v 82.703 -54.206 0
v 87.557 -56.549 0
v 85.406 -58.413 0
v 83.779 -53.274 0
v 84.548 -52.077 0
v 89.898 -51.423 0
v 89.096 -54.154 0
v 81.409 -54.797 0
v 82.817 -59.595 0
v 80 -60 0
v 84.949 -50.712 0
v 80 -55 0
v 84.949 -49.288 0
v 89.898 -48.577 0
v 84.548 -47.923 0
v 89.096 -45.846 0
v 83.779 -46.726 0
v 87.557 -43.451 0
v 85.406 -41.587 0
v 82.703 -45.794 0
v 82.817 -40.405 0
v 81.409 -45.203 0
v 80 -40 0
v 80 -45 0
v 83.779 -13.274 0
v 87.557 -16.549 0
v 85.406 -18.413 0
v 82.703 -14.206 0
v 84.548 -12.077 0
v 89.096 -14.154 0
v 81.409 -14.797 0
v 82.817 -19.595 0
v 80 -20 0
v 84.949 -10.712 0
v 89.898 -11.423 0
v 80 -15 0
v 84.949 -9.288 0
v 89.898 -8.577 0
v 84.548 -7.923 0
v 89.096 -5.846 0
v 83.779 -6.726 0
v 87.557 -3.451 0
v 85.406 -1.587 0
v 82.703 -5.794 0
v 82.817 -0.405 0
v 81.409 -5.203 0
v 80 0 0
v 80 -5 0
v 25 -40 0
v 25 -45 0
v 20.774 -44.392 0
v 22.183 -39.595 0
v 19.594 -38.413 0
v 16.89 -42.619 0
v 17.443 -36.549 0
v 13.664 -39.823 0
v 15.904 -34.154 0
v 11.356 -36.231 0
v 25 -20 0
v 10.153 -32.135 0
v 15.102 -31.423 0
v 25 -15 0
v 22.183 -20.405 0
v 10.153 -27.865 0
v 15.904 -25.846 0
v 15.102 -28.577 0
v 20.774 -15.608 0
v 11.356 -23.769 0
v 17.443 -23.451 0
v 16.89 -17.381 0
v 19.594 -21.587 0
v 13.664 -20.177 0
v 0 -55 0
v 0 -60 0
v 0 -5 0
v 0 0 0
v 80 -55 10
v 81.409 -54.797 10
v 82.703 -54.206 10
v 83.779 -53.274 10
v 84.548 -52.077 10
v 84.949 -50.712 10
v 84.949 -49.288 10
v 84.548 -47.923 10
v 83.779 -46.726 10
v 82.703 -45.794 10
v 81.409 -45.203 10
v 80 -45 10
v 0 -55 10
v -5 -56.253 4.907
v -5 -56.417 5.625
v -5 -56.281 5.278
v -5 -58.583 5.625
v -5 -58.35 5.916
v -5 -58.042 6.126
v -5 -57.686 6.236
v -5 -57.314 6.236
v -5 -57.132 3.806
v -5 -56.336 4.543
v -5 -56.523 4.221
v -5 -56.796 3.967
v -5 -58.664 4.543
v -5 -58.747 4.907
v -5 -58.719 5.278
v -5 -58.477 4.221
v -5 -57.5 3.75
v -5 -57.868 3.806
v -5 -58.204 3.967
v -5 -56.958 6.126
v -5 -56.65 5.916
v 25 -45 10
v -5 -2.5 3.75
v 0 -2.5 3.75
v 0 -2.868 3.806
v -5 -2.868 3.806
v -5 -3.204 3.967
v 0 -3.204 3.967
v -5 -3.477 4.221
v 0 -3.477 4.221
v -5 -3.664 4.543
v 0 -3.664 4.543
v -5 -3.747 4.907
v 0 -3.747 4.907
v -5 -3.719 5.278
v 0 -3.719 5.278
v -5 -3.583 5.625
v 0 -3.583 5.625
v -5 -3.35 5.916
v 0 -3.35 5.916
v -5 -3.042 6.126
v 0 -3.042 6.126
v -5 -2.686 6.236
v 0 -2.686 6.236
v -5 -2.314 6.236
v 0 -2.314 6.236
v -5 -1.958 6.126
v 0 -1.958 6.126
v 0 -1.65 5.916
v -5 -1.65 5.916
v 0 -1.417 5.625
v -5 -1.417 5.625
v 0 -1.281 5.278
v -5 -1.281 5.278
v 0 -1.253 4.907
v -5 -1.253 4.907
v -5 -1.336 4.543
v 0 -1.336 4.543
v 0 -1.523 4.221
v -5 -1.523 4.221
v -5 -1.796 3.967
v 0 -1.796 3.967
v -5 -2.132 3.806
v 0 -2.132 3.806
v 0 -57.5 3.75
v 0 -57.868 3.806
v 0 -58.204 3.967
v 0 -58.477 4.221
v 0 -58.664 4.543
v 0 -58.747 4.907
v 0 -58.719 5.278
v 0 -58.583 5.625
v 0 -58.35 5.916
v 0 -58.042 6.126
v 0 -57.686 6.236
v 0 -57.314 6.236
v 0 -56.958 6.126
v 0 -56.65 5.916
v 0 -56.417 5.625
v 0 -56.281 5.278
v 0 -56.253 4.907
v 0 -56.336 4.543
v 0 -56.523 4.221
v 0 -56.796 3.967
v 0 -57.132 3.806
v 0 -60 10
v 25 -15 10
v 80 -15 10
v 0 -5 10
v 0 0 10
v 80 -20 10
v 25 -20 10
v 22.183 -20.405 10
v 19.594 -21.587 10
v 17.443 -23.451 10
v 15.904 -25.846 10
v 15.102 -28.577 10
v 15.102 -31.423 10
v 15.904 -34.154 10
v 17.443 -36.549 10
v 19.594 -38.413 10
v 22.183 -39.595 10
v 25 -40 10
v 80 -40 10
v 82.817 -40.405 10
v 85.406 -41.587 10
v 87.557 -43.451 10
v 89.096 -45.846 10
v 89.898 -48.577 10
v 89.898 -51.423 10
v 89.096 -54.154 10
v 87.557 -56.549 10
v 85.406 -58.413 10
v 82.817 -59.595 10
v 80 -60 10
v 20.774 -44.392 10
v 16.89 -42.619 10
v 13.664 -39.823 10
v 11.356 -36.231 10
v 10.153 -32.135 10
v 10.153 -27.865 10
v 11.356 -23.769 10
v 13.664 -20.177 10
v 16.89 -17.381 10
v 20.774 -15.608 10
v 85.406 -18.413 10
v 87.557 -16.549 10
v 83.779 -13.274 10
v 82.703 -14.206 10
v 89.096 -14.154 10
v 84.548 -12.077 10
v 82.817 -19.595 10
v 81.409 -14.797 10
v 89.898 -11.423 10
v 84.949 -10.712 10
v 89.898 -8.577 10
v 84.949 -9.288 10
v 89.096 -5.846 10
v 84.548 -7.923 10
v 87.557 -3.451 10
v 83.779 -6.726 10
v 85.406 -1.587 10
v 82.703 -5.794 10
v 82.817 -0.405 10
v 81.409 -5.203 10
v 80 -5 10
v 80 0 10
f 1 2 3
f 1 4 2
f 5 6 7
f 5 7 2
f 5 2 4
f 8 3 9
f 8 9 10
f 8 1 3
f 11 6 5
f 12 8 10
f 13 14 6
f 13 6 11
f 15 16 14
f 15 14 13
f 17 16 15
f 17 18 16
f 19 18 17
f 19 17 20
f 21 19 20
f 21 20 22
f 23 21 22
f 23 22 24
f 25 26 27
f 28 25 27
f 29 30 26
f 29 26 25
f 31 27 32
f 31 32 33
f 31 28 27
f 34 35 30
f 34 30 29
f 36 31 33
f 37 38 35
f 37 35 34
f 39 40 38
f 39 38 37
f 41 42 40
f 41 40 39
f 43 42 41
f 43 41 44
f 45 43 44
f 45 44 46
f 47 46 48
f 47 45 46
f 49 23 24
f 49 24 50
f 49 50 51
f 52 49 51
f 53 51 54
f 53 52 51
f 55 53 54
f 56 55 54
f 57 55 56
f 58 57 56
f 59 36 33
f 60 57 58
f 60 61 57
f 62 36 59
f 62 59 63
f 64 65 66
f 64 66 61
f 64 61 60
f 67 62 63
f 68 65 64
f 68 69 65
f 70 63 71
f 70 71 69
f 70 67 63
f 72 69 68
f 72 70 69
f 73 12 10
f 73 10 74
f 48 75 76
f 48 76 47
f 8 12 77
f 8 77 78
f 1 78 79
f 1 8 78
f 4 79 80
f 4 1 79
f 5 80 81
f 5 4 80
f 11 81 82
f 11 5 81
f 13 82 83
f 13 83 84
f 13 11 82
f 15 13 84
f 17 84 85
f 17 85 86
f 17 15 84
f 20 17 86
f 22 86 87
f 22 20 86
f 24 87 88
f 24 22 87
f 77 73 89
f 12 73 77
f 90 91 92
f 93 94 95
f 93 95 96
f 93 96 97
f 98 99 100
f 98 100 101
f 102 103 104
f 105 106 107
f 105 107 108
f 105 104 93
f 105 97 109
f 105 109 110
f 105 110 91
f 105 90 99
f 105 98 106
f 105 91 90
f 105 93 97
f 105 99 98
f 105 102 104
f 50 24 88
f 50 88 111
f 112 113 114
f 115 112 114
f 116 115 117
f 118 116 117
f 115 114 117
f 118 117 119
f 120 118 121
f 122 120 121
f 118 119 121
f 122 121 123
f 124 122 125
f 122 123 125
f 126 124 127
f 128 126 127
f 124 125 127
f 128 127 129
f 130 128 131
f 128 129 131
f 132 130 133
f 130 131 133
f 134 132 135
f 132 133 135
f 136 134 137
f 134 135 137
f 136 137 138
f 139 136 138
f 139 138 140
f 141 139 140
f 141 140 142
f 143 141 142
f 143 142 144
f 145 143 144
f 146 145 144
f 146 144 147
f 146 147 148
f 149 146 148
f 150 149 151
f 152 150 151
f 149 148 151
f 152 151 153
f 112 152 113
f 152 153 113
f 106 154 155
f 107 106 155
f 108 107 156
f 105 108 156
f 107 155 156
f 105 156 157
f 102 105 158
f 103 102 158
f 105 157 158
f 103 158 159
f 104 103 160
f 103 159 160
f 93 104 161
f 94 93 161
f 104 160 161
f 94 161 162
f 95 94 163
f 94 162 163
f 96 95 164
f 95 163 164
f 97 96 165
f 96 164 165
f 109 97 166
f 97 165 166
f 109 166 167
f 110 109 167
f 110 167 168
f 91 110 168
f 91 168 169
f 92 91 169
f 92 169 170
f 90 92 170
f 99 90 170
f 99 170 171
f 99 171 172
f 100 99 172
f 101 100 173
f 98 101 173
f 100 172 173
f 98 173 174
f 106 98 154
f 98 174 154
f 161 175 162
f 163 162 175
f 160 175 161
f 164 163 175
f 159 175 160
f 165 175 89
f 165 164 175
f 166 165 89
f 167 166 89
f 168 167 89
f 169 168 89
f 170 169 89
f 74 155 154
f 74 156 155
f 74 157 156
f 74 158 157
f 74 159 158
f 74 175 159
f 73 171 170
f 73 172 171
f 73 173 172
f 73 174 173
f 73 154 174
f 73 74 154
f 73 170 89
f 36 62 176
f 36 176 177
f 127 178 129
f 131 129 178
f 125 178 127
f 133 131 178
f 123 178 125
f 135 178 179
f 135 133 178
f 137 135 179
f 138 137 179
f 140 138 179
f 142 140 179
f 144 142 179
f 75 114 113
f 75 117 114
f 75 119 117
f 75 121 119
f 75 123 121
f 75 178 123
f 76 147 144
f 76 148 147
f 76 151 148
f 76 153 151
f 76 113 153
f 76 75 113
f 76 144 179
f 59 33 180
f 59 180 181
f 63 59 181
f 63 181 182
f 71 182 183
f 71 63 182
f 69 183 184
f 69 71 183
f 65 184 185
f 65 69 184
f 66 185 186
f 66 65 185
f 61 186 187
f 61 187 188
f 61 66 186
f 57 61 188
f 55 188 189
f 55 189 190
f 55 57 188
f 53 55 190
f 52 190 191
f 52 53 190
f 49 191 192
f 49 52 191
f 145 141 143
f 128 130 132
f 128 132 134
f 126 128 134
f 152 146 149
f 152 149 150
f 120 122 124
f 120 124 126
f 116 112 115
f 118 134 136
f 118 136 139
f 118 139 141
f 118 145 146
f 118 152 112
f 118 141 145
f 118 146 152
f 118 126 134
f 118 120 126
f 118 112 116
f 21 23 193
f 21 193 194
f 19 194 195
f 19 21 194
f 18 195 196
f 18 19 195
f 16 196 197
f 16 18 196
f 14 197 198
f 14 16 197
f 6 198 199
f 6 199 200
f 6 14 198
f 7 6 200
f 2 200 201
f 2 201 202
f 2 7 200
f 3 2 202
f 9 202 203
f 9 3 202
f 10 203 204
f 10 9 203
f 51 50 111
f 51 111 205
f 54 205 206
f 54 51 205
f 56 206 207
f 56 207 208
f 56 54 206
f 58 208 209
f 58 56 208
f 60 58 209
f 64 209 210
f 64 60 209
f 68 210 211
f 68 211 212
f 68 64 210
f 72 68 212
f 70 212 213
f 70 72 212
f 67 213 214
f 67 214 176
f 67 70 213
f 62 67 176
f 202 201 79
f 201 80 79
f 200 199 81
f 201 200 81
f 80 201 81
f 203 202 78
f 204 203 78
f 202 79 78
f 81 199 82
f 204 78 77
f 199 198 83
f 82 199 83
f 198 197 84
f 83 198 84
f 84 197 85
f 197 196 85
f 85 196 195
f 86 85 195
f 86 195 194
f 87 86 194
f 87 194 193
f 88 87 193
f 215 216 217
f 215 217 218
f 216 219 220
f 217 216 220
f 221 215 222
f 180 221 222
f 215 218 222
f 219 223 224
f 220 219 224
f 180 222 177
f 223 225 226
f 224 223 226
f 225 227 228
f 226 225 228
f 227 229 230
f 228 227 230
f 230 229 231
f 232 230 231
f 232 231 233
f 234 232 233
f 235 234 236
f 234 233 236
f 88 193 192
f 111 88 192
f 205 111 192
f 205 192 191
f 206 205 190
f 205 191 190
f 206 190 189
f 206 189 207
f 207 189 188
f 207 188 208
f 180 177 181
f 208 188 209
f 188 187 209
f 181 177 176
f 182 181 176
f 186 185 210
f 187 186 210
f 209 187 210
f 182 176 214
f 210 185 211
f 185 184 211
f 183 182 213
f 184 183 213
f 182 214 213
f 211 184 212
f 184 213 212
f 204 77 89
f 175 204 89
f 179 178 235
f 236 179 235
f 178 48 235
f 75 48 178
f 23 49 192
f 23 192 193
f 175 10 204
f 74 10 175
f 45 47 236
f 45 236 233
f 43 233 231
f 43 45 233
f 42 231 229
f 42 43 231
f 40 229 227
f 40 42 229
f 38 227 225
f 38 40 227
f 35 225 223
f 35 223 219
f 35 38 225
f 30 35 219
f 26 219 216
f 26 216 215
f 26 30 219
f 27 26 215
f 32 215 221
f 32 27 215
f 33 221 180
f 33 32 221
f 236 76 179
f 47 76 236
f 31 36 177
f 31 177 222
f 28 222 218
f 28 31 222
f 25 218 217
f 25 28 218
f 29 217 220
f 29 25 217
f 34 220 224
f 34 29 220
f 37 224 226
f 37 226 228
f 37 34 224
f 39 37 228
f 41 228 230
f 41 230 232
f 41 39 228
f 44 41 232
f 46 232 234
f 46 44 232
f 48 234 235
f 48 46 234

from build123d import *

# Parameters (mm, degrees)
BOSS_EXTRUDE1_DEPTH = 10
SKETCH2_R           = 1.25
BOSS_EXTRUDE2_DEPTH = 5
SKETCH3_R           = 1.25
BOSS_EXTRUDE3_DEPTH = 5


with BuildPart() as part:
    # Sketch1 → Boss-Extrude1 (new body)
    with BuildSketch(Plane.XY):
        with BuildLine():
            Line((0, 0), (80, 0))
            ThreePointArc((80, 0), (90, -10), (80, -20))
            Line((80, -20), (25, -20))
            ThreePointArc((25, -20), (15, -30), (25, -40))
            Line((25, -40), (80, -40))
            ThreePointArc((80, -40), (90, -50), (80, -60))
            Line((80, -60), (0, -60))
            Line((0, -60), (0, -55))
            Line((0, -55), (80, -55))
            ThreePointArc((80, -55), (85, -50), (80, -45))
            Line((80, -45), (25, -45))
            ThreePointArc((25, -45), (10, -30), (25, -15))
            Line((25, -15), (80, -15))
            ThreePointArc((80, -15), (85, -10), (80, -5))
            Line((80, -5), (0, -5))
            Line((0, -5), (0, 0))
        make_face()
    extrude(amount=BOSS_EXTRUDE1_DEPTH)

    # Sketch2 → Boss-Extrude2 (add)
    with BuildSketch(Plane.ZY):
        with Locations(Location((5, -2.5, 0), (0, 0, 180))):
            Circle(SKETCH2_R)
    extrude(amount=BOSS_EXTRUDE2_DEPTH)

    # Sketch3 → Boss-Extrude3 (add)
    with BuildSketch(Plane.ZY):
        with Locations(Location((5, -57.5, 0), (0, 0, 180))):
            Circle(SKETCH3_R)
    extrude(amount=BOSS_EXTRUDE3_DEPTH)


solid = part.part
